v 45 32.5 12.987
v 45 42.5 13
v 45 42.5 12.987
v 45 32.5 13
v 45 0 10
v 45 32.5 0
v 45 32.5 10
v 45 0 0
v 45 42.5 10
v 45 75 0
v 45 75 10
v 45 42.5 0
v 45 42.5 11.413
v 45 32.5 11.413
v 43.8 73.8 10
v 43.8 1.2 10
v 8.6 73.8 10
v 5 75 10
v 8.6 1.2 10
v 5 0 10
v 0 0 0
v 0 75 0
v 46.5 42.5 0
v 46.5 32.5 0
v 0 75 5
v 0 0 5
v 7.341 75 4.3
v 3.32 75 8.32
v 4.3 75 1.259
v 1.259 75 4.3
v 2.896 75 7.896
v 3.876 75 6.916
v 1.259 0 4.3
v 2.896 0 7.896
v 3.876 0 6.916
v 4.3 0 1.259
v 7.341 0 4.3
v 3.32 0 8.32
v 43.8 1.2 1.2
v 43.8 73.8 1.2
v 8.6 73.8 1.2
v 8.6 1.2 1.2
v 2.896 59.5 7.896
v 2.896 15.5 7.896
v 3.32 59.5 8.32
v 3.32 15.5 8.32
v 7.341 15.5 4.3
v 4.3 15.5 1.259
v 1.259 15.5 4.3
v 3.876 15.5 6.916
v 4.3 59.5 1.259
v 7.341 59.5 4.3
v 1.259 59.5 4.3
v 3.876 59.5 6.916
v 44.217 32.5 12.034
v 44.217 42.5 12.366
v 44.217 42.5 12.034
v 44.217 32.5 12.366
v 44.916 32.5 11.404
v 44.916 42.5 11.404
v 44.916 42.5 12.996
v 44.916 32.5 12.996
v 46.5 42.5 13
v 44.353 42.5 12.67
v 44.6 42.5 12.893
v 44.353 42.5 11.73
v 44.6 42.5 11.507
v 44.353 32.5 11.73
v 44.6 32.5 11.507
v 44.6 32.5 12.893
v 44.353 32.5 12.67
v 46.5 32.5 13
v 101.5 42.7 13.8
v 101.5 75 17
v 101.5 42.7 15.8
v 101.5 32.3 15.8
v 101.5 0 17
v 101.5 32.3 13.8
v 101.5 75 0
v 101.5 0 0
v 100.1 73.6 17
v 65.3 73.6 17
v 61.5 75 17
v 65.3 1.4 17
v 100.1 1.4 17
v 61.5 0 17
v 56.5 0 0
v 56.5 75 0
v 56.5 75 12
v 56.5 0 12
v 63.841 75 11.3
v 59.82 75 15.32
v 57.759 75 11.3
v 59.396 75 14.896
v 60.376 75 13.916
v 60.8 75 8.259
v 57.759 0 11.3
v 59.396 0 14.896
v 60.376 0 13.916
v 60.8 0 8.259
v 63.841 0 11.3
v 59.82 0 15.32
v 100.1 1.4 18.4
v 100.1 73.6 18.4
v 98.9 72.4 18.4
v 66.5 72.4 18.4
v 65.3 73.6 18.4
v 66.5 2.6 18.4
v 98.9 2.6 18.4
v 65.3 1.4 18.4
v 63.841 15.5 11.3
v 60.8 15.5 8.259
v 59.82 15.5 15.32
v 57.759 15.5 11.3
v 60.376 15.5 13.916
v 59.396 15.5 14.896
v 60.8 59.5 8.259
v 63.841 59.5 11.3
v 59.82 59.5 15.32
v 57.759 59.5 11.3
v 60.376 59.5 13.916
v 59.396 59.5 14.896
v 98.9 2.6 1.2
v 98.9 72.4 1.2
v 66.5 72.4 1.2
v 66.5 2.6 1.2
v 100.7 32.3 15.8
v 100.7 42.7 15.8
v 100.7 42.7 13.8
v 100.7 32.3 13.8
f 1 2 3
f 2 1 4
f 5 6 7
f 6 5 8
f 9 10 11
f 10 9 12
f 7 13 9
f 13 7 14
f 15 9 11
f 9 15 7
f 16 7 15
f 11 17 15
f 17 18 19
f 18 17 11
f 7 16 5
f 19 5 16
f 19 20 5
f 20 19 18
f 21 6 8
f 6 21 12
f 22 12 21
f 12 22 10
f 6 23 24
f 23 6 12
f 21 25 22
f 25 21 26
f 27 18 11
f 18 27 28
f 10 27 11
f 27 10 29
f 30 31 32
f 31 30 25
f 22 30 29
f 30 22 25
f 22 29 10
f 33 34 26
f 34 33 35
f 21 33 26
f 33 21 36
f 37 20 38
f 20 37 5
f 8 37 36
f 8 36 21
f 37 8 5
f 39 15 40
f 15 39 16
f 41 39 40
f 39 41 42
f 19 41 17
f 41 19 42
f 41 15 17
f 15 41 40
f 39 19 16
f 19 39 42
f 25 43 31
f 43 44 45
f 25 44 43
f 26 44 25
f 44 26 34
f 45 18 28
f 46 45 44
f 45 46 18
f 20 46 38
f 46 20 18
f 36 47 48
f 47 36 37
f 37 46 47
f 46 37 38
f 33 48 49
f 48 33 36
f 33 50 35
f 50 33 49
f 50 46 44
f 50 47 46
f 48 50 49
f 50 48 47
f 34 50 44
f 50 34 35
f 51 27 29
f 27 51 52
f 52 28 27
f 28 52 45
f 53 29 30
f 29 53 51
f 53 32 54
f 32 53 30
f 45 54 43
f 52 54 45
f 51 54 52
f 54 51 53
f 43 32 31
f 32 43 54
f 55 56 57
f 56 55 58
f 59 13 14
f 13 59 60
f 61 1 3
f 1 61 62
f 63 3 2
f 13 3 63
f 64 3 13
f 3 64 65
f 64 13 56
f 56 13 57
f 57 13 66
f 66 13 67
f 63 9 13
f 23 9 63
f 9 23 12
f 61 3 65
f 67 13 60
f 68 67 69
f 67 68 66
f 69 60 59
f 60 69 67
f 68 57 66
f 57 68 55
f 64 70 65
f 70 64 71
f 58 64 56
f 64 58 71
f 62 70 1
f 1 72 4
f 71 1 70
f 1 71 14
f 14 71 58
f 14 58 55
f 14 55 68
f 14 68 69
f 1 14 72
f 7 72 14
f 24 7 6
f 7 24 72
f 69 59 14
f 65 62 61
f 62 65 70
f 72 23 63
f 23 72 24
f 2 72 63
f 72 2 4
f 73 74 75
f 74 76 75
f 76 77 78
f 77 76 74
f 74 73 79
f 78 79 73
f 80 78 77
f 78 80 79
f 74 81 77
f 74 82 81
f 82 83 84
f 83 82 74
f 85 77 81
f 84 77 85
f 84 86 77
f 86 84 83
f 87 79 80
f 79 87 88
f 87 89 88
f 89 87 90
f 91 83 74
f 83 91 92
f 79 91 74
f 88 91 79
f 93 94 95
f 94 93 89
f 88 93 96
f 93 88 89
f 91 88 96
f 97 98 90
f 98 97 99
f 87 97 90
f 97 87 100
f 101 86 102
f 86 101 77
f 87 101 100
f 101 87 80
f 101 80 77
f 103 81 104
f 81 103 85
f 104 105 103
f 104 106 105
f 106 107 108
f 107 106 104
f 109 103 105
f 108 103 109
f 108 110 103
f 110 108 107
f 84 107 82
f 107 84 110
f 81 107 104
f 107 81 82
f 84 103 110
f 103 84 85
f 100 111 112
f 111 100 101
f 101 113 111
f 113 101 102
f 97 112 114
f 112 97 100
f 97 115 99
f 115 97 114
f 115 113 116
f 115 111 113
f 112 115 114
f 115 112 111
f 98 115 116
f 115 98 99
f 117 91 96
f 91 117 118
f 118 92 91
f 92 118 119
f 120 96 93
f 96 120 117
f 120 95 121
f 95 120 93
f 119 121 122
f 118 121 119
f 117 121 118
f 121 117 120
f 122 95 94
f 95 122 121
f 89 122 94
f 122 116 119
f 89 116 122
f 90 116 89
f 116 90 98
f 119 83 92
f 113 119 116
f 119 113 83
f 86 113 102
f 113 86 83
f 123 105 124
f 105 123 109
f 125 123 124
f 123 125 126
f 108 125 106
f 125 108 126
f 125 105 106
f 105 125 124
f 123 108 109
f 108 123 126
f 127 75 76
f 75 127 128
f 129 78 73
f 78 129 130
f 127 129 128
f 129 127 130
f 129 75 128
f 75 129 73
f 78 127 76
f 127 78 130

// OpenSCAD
/* [Overall dimensions] */
box_width = 45;
box_length = 75;
top_height = 10;
bottom_height = 17;

/* [Walls] */
wall_thickness = 1.2;
floor_thickness = 1.2;

/* [Lock] */
lock_width = 10;
lock_thickness = 1.5;
lock_height = 3;
button_width = 1.6;
button_gap = 0.2;

/* [Lip] */
lip_height = 1.4;
lip_thickness = 1.2;
lip_gap = 0.2;

/* [Hidden] */
hinge_square = 4.3;
facet = 5;
hinge_length = 15;
hinge_gap = 0.6;

$fn = 15;

module hinge_hole(hinge_height) {
    translate([hinge_square, hinge_length/2, hinge_height-10+hinge_square]) {
        rotate(45, [0, 1, 0]) {
            cube([hinge_square, hinge_length+1, hinge_square], true);
            translate([-10, 0, (hinge_square-hinge_gap)/2]) {
                cube([20, hinge_length+1, hinge_gap], true);
            }
        }
    }
}

module box_top() {
    difference() {
        difference() {
            cube([box_width, box_length, top_height]);
            translate([hinge_square*2, wall_thickness, floor_thickness]) {
                    cube([box_width-hinge_square*2-wall_thickness, box_length-wall_thickness*2, top_height-floor_thickness+1]);
                }
            translate([0, -1, top_height-facet]) {
                rotate(-45, [0, 1, 0]) {
                    cube([20, box_length+2, 20]);
                }
            }
        }
        hinge_hole(top_height);
        translate([0, box_length, 0]) {
            mirror([0, 1, 0]) {
                hinge_hole(top_height);
            }
        }
    }
    translate([box_width, (box_length-lock_width)/2, 0]) {
        cube([lock_thickness, lock_width, top_height+lock_height]);
    }
    translate([box_width, (box_length-lock_width)/2, top_height+lock_height-button_width/2]) {
        difference() {
            rotate(-90, [1, 0, 0]) {
                cylinder(lock_width, button_width/2, button_width/2);
            }
            translate([button_width/2, lock_width/2, 0]) {
                cube([button_width, lock_width, button_width], true);
            }
        }
    }
}

module box_buttom() {
    difference() {
        union() {
            cube([box_width, box_length, bottom_height]);
            translate([hinge_square*2+lip_gap, wall_thickness+lip_gap, floor_thickness]) {
                cube([box_width-hinge_square*2-wall_thickness-lip_gap*2, box_length-wall_thickness*2-lip_gap*2, bottom_height-floor_thickness+lip_height]);
            }
        }
        translate([0, -1, bottom_height-facet]) {
            rotate(-45, [0, 1, 0]) {
                cube([20, box_length+2, 20]);
            }
        }
        translate([hinge_square*2+lip_gap+lip_thickness, wall_thickness+lip_gap+lip_thickness, floor_thickness]) {
            cube([box_width-hinge_square*2-wall_thickness-lip_gap*2-lip_thickness*2, box_length-wall_thickness*2-lip_gap*2-lip_thickness*2, bottom_height-floor_thickness+lip_height+1]);
        }
        hinge_hole(bottom_height);
        translate([0, box_length, 0]) {
            mirror([0, 1, 0]) {
                hinge_hole(bottom_height);
            }
        }
        translate([box_width-button_width/2, (box_length-lock_width)/2-button_gap, bottom_height-lock_height-button_gap]) {
            cube([button_width+1, lock_width+button_gap*2, button_width+button_gap*2]);
        }
    }
}

translate([0, 0, 0]) {
    box_top();
}
translate([box_width+lock_thickness+10, 0, 0]) {
    box_buttom();
}
